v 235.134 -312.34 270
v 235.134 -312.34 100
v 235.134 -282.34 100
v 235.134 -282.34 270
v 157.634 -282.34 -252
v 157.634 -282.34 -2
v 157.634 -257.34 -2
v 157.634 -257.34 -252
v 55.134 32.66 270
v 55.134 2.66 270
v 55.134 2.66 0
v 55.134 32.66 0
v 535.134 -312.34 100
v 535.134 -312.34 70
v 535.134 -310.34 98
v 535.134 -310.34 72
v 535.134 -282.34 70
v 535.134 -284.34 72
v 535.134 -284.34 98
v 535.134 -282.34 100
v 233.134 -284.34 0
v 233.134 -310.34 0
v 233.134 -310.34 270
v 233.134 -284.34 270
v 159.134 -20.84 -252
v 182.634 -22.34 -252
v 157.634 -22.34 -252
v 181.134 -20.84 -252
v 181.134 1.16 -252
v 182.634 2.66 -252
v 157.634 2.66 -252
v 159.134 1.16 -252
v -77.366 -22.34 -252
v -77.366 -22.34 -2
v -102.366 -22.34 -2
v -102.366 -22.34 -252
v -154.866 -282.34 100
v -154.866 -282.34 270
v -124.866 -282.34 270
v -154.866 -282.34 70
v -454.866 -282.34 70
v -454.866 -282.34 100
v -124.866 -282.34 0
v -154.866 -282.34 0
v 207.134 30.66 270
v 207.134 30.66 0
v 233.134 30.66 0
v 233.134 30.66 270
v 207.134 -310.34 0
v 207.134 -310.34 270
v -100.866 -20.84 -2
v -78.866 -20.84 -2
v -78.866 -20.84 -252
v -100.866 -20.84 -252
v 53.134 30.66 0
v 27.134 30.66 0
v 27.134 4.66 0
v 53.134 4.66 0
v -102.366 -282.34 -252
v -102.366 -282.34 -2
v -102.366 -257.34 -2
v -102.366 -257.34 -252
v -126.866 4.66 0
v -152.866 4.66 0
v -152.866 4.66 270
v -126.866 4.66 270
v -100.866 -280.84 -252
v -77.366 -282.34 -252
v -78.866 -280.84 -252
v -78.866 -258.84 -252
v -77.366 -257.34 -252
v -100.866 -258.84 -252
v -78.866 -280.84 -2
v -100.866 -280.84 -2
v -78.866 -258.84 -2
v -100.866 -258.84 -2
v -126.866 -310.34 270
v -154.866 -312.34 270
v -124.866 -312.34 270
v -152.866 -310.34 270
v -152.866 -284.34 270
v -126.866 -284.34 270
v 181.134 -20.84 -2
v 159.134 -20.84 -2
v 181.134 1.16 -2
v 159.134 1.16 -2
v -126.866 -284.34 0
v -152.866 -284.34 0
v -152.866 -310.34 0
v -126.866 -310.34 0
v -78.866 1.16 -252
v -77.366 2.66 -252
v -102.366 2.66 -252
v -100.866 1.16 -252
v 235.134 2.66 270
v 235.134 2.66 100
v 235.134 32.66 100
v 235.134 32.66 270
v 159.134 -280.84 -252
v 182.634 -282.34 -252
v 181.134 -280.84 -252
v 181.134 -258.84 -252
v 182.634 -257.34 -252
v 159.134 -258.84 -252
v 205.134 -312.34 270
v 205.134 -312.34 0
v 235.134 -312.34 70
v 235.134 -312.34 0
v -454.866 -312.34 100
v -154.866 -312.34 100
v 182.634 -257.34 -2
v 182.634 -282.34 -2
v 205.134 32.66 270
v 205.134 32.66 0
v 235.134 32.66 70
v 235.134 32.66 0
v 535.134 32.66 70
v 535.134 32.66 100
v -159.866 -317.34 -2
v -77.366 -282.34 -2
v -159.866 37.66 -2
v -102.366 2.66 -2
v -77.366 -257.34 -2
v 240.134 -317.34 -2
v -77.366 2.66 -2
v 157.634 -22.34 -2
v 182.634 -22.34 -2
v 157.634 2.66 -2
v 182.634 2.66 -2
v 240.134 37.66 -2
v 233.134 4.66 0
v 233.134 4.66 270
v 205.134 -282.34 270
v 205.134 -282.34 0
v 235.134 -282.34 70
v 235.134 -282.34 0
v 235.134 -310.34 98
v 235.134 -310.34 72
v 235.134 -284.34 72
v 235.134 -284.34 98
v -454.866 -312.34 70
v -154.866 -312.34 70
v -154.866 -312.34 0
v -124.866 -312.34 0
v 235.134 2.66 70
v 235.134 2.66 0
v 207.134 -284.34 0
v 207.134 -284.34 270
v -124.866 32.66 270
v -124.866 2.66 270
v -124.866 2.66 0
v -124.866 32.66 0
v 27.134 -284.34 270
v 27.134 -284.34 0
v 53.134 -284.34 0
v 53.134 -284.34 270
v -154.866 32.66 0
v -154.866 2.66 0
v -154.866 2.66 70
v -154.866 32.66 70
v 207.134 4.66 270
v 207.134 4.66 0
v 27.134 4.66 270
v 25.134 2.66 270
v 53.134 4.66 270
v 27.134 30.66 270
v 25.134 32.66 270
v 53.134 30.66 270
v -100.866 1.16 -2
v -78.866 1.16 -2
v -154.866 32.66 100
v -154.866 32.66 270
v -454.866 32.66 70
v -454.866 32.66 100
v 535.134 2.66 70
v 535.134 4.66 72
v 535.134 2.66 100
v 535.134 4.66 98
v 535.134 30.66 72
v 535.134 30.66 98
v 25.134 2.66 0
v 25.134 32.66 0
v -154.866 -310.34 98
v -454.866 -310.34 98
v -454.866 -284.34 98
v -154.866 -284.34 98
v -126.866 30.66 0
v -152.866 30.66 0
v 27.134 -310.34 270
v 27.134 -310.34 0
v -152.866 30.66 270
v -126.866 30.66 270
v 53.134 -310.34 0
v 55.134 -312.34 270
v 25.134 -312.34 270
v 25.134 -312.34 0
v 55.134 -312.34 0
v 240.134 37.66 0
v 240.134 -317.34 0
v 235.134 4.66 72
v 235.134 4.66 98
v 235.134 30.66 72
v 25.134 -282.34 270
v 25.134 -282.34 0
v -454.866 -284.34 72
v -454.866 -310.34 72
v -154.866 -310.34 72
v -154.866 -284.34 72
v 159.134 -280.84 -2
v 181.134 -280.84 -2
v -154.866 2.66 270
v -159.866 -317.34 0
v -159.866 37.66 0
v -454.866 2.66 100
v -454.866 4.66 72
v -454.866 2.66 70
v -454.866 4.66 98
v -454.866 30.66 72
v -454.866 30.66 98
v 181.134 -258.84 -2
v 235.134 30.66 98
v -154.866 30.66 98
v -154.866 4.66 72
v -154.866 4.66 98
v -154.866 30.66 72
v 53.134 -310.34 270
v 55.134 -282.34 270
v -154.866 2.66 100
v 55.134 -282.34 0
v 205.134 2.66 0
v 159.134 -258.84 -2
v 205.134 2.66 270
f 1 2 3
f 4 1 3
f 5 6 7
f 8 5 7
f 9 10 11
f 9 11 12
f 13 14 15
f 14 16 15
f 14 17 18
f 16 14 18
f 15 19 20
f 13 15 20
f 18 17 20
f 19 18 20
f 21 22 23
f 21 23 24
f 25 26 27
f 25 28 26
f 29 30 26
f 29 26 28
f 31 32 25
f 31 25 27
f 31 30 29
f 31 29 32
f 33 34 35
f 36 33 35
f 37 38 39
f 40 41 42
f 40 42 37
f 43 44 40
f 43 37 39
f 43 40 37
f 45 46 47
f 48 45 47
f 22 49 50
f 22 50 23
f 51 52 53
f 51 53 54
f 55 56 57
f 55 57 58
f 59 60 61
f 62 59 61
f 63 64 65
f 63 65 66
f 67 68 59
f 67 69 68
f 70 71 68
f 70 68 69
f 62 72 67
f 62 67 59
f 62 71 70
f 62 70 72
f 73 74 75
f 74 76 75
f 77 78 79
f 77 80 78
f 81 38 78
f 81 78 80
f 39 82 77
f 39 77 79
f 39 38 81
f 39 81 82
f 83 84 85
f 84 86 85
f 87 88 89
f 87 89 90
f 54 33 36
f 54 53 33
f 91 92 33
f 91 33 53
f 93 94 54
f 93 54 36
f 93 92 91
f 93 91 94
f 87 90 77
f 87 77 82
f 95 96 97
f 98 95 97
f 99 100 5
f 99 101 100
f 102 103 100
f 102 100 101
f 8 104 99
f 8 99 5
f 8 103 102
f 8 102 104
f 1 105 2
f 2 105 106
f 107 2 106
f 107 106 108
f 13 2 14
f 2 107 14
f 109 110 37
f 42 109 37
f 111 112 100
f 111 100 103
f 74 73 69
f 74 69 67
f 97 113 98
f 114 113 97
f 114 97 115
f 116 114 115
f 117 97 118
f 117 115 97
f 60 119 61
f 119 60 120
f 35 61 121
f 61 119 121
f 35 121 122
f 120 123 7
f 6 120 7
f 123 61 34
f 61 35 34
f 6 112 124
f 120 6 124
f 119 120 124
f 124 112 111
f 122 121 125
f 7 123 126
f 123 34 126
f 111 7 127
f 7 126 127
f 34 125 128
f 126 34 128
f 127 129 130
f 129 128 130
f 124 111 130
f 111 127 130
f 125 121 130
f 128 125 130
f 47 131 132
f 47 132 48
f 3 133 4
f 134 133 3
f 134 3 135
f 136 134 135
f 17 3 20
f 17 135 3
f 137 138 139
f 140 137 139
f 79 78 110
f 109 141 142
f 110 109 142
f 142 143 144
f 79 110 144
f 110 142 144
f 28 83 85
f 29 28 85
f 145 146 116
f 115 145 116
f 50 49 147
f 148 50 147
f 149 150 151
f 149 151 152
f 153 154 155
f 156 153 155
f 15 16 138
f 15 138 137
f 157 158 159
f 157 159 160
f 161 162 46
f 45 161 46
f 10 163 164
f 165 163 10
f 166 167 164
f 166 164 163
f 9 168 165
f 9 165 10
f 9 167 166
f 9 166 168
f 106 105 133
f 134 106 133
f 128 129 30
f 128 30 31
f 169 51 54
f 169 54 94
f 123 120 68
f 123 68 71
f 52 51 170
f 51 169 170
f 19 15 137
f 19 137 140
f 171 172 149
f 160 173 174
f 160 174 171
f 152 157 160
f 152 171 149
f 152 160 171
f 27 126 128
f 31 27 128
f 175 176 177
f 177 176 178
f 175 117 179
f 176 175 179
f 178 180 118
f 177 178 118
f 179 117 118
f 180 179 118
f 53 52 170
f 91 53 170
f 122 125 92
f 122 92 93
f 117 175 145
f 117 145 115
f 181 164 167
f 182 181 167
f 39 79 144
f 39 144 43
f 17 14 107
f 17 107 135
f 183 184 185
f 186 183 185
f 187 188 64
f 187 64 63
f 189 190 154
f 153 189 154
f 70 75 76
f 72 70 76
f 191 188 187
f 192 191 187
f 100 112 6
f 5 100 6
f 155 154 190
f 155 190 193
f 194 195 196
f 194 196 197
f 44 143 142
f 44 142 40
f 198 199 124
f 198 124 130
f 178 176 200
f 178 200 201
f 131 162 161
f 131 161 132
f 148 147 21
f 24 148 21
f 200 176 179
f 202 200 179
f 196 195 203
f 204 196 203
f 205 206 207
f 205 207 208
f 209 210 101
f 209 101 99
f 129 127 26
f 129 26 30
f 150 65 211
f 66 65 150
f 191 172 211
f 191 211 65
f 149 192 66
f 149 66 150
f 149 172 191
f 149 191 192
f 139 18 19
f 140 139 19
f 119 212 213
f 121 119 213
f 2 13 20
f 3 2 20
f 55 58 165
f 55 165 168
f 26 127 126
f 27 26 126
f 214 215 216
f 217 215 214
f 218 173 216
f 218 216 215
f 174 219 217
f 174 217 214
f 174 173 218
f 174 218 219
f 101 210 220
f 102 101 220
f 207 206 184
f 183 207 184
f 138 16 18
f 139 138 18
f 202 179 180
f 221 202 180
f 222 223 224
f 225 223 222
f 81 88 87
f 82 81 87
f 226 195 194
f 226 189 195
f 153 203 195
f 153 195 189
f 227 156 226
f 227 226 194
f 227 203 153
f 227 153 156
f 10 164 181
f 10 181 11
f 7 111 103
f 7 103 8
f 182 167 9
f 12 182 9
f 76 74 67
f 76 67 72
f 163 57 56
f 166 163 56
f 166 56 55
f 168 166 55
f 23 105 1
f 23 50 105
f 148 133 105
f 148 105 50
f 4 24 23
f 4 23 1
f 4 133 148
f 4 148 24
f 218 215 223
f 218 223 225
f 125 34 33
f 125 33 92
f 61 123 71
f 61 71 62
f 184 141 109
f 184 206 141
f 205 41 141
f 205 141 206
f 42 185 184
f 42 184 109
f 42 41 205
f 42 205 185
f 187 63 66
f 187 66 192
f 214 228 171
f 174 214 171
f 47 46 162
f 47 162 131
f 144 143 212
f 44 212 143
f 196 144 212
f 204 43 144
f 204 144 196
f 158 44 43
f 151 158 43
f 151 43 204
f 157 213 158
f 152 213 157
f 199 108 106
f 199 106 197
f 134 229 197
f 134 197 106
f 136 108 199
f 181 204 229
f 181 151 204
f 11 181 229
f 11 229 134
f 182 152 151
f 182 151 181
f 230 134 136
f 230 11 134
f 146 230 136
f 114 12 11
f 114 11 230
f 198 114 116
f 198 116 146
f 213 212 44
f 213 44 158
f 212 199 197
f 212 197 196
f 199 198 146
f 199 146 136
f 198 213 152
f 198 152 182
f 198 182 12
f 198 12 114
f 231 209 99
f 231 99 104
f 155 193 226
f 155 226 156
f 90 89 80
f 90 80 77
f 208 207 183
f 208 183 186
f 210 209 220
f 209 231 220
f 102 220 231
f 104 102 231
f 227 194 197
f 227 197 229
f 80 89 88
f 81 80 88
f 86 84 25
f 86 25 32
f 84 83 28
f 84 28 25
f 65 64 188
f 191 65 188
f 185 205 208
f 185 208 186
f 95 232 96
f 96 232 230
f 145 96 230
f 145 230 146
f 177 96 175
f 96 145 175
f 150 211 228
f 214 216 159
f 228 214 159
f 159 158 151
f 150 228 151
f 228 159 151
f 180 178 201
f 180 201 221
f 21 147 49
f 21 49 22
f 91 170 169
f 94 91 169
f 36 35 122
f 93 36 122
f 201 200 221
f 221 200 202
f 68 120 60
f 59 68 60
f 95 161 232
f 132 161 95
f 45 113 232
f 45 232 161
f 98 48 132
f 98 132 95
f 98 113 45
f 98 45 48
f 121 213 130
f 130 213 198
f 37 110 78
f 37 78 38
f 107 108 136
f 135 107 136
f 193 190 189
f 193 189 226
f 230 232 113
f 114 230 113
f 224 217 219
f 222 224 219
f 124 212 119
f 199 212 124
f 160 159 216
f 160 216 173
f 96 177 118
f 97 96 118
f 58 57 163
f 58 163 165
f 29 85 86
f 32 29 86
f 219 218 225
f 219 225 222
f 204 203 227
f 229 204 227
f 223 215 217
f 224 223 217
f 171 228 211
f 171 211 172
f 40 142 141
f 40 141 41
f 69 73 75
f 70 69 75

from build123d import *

# Parameters (mm, degrees)
SKETCH_1_W        = 30
SKETCH_1_H        = 30
SKETCH_1_W_2      = 26
SKETCH_1_H_2      = 26
EXTRUDE_1_DEPTH   = 270
EXTRUDE_1_2_DEPTH = 270
EXTRUDE_1_3_DEPTH = 270
EXTRUDE_1_4_DEPTH = 270
EXTRUDE_1_5_DEPTH = 270
EXTRUDE_1_6_DEPTH = 270
SKETCH_1_4_W      = 400
SKETCH_1_4_H      = 355
EXTRUDE_2_DEPTH   = 2
SKETCH_3_W        = 25
SKETCH_3_H        = 25
SKETCH_3_W_2      = 22
SKETCH_3_H_2      = 22
EXTRUDE_3_DEPTH   = 250
SKETCH_8_W        = 30
SKETCH_8_H        = 30
SKETCH_8_W_2      = 26
SKETCH_8_H_2      = 26
EXTRUDE_4_DEPTH   = 300


with BuildPart() as part:
    # 草圖1 → 填料-伸長1 (new body)
    with BuildSketch(Plane.XY):
        with Locations((-139.865693992, 17.660065035)):
            Rectangle(SKETCH_1_W, SKETCH_1_H)
        with Locations((-139.865693992, 17.660065035)):
            Rectangle(SKETCH_1_W_2, SKETCH_1_H_2, mode=Mode.SUBTRACT)
    extrude(amount=EXTRUDE_1_DEPTH)



with BuildPart() as body_2:
    # 草圖1 → Extrude 1 2 (new body)
    with BuildSketch(Plane.XY):
        with Locations((40.134306008, 17.660065035)):
            Rectangle(SKETCH_1_W, SKETCH_1_H)
        with Locations((40.134306008, 17.660065035)):
            Rectangle(SKETCH_1_W_2, SKETCH_1_H_2, mode=Mode.SUBTRACT)
    extrude(amount=EXTRUDE_1_2_DEPTH)


with BuildPart() as body_3:
    # 草圖1 → Extrude 1 3 (new body)
    with BuildSketch(Plane.XY):
        with Locations((220.134306008, 17.660065035)):
            Rectangle(SKETCH_1_W, SKETCH_1_H)
        with Locations((220.134306008, 17.660065035)):
            Rectangle(SKETCH_1_W_2, SKETCH_1_H_2, mode=Mode.SUBTRACT)
    extrude(amount=EXTRUDE_1_3_DEPTH)


with BuildPart() as body_4:
    # 草圖1 → Extrude 1 4 (new body)
    with BuildSketch(Plane.XY):
        with Locations((-139.865693992, -297.339934965)):
            Rectangle(SKETCH_1_W, SKETCH_1_H)
        with Locations((-139.865693992, -297.339934965)):
            Rectangle(SKETCH_1_W_2, SKETCH_1_H_2, mode=Mode.SUBTRACT)
    extrude(amount=EXTRUDE_1_4_DEPTH)


with BuildPart() as body_5:
    # 草圖1 → Extrude 1 5 (new body)
    with BuildSketch(Plane.XY):
        with Locations((40.134306008, -297.339934965)):
            Rectangle(SKETCH_1_W, SKETCH_1_H)
        with Locations((40.134306008, -297.339934965)):
            Rectangle(SKETCH_1_W_2, SKETCH_1_H_2, mode=Mode.SUBTRACT)
    extrude(amount=EXTRUDE_1_5_DEPTH)


with BuildPart() as body_6:
    # 草圖1 → Extrude 1 6 (new body)
    with BuildSketch(Plane.XY):
        with Locations((220.134306008, -297.339934965)):
            Rectangle(SKETCH_1_W, SKETCH_1_H)
        with Locations((220.134306008, -297.339934965)):
            Rectangle(SKETCH_1_W_2, SKETCH_1_H_2, mode=Mode.SUBTRACT)
    extrude(amount=EXTRUDE_1_6_DEPTH)


with BuildPart() as part_1:
    add(part.part)

    add(body_2.part)  # 填料-伸長2 merges body 2

    add(body_3.part)  # 填料-伸長2 merges body 3

    add(body_4.part)  # 填料-伸長2 merges body 4

    add(body_5.part)  # 填料-伸長2 merges body 5

    add(body_6.part)  # 填料-伸長2 merges body 6
    # 草圖1<4> → 填料-伸長2 (add)
    with BuildSketch(Plane.XY):
        with Locations((40.134306008, -139.839934965)):
            Rectangle(SKETCH_1_4_W, SKETCH_1_4_H)
    extrude(amount=-EXTRUDE_2_DEPTH)

    # 草圖3 → 填料-伸長3 (add)
    # profile 1 of 4: a face of its own
    with BuildSketch(Plane(origin=(0, 0, -2), x_dir=(-1, 0, 0), z_dir=(0, 0, -1))):
        with Locations((-170.134306008, -9.839934965)):
            Rectangle(SKETCH_3_W, SKETCH_3_H)
        with Locations((-170.134306008, -9.839934965)):
            Rectangle(SKETCH_3_W_2, SKETCH_3_H_2, mode=Mode.SUBTRACT)
    # profile 2 of 4: a face of its own
    with BuildSketch(Plane(origin=(0, 0, -2), x_dir=(-1, 0, 0), z_dir=(0, 0, -1))):
        with Locations((-170.134306008, -269.839934965)):
            Rectangle(SKETCH_3_W, SKETCH_3_H)
        with Locations((-170.134306008, -269.839934965)):
            Rectangle(SKETCH_3_W_2, SKETCH_3_H_2, mode=Mode.SUBTRACT)
    # profile 3 of 4: a face of its own
    with BuildSketch(Plane(origin=(0, 0, -2), x_dir=(-1, 0, 0), z_dir=(0, 0, -1))):
        with Locations((89.865693992, -269.839934965)):
            Rectangle(SKETCH_3_W, SKETCH_3_H)
        with Locations((89.865693992, -269.839934965)):
            Rectangle(SKETCH_3_W_2, SKETCH_3_H_2, mode=Mode.SUBTRACT)
    # profile 4 of 4: a face of its own
    with BuildSketch(Plane(origin=(0, 0, -2), x_dir=(-1, 0, 0), z_dir=(0, 0, -1))):
        with Locations((89.865693992, -9.839934965)):
            Rectangle(SKETCH_3_W, SKETCH_3_H)
        with Locations((89.865693992, -9.839934965)):
            Rectangle(SKETCH_3_W_2, SKETCH_3_H_2, mode=Mode.SUBTRACT)
    extrude(amount=EXTRUDE_3_DEPTH)

    # 草圖8 → 填料-伸長4 (add)
    # profile 1 of 2: a face of its own
    with BuildSketch(Plane.ZY.offset(154.865693992)):
        with Locations((85, -297.339934965)):
            Rectangle(SKETCH_8_W, SKETCH_8_H)
        with Locations((85, -297.339934965)):
            Rectangle(SKETCH_8_W_2, SKETCH_8_H_2, mode=Mode.SUBTRACT)
    # profile 2 of 2: a face of its own
    with BuildSketch(Plane.ZY.offset(154.865693992)):
        with Locations((85, 17.660065035)):
            Rectangle(SKETCH_8_W, SKETCH_8_H)
        with Locations((85, 17.660065035)):
            Rectangle(SKETCH_8_W_2, SKETCH_8_H_2, mode=Mode.SUBTRACT)
    extrude_4 = extrude(amount=EXTRUDE_4_DEPTH)

    # 鏡射1: 填料-伸長4 across plane
    add(extrude_4.mirror(Plane.ZY.offset(-40.134306008)))


solid = part_1.part
